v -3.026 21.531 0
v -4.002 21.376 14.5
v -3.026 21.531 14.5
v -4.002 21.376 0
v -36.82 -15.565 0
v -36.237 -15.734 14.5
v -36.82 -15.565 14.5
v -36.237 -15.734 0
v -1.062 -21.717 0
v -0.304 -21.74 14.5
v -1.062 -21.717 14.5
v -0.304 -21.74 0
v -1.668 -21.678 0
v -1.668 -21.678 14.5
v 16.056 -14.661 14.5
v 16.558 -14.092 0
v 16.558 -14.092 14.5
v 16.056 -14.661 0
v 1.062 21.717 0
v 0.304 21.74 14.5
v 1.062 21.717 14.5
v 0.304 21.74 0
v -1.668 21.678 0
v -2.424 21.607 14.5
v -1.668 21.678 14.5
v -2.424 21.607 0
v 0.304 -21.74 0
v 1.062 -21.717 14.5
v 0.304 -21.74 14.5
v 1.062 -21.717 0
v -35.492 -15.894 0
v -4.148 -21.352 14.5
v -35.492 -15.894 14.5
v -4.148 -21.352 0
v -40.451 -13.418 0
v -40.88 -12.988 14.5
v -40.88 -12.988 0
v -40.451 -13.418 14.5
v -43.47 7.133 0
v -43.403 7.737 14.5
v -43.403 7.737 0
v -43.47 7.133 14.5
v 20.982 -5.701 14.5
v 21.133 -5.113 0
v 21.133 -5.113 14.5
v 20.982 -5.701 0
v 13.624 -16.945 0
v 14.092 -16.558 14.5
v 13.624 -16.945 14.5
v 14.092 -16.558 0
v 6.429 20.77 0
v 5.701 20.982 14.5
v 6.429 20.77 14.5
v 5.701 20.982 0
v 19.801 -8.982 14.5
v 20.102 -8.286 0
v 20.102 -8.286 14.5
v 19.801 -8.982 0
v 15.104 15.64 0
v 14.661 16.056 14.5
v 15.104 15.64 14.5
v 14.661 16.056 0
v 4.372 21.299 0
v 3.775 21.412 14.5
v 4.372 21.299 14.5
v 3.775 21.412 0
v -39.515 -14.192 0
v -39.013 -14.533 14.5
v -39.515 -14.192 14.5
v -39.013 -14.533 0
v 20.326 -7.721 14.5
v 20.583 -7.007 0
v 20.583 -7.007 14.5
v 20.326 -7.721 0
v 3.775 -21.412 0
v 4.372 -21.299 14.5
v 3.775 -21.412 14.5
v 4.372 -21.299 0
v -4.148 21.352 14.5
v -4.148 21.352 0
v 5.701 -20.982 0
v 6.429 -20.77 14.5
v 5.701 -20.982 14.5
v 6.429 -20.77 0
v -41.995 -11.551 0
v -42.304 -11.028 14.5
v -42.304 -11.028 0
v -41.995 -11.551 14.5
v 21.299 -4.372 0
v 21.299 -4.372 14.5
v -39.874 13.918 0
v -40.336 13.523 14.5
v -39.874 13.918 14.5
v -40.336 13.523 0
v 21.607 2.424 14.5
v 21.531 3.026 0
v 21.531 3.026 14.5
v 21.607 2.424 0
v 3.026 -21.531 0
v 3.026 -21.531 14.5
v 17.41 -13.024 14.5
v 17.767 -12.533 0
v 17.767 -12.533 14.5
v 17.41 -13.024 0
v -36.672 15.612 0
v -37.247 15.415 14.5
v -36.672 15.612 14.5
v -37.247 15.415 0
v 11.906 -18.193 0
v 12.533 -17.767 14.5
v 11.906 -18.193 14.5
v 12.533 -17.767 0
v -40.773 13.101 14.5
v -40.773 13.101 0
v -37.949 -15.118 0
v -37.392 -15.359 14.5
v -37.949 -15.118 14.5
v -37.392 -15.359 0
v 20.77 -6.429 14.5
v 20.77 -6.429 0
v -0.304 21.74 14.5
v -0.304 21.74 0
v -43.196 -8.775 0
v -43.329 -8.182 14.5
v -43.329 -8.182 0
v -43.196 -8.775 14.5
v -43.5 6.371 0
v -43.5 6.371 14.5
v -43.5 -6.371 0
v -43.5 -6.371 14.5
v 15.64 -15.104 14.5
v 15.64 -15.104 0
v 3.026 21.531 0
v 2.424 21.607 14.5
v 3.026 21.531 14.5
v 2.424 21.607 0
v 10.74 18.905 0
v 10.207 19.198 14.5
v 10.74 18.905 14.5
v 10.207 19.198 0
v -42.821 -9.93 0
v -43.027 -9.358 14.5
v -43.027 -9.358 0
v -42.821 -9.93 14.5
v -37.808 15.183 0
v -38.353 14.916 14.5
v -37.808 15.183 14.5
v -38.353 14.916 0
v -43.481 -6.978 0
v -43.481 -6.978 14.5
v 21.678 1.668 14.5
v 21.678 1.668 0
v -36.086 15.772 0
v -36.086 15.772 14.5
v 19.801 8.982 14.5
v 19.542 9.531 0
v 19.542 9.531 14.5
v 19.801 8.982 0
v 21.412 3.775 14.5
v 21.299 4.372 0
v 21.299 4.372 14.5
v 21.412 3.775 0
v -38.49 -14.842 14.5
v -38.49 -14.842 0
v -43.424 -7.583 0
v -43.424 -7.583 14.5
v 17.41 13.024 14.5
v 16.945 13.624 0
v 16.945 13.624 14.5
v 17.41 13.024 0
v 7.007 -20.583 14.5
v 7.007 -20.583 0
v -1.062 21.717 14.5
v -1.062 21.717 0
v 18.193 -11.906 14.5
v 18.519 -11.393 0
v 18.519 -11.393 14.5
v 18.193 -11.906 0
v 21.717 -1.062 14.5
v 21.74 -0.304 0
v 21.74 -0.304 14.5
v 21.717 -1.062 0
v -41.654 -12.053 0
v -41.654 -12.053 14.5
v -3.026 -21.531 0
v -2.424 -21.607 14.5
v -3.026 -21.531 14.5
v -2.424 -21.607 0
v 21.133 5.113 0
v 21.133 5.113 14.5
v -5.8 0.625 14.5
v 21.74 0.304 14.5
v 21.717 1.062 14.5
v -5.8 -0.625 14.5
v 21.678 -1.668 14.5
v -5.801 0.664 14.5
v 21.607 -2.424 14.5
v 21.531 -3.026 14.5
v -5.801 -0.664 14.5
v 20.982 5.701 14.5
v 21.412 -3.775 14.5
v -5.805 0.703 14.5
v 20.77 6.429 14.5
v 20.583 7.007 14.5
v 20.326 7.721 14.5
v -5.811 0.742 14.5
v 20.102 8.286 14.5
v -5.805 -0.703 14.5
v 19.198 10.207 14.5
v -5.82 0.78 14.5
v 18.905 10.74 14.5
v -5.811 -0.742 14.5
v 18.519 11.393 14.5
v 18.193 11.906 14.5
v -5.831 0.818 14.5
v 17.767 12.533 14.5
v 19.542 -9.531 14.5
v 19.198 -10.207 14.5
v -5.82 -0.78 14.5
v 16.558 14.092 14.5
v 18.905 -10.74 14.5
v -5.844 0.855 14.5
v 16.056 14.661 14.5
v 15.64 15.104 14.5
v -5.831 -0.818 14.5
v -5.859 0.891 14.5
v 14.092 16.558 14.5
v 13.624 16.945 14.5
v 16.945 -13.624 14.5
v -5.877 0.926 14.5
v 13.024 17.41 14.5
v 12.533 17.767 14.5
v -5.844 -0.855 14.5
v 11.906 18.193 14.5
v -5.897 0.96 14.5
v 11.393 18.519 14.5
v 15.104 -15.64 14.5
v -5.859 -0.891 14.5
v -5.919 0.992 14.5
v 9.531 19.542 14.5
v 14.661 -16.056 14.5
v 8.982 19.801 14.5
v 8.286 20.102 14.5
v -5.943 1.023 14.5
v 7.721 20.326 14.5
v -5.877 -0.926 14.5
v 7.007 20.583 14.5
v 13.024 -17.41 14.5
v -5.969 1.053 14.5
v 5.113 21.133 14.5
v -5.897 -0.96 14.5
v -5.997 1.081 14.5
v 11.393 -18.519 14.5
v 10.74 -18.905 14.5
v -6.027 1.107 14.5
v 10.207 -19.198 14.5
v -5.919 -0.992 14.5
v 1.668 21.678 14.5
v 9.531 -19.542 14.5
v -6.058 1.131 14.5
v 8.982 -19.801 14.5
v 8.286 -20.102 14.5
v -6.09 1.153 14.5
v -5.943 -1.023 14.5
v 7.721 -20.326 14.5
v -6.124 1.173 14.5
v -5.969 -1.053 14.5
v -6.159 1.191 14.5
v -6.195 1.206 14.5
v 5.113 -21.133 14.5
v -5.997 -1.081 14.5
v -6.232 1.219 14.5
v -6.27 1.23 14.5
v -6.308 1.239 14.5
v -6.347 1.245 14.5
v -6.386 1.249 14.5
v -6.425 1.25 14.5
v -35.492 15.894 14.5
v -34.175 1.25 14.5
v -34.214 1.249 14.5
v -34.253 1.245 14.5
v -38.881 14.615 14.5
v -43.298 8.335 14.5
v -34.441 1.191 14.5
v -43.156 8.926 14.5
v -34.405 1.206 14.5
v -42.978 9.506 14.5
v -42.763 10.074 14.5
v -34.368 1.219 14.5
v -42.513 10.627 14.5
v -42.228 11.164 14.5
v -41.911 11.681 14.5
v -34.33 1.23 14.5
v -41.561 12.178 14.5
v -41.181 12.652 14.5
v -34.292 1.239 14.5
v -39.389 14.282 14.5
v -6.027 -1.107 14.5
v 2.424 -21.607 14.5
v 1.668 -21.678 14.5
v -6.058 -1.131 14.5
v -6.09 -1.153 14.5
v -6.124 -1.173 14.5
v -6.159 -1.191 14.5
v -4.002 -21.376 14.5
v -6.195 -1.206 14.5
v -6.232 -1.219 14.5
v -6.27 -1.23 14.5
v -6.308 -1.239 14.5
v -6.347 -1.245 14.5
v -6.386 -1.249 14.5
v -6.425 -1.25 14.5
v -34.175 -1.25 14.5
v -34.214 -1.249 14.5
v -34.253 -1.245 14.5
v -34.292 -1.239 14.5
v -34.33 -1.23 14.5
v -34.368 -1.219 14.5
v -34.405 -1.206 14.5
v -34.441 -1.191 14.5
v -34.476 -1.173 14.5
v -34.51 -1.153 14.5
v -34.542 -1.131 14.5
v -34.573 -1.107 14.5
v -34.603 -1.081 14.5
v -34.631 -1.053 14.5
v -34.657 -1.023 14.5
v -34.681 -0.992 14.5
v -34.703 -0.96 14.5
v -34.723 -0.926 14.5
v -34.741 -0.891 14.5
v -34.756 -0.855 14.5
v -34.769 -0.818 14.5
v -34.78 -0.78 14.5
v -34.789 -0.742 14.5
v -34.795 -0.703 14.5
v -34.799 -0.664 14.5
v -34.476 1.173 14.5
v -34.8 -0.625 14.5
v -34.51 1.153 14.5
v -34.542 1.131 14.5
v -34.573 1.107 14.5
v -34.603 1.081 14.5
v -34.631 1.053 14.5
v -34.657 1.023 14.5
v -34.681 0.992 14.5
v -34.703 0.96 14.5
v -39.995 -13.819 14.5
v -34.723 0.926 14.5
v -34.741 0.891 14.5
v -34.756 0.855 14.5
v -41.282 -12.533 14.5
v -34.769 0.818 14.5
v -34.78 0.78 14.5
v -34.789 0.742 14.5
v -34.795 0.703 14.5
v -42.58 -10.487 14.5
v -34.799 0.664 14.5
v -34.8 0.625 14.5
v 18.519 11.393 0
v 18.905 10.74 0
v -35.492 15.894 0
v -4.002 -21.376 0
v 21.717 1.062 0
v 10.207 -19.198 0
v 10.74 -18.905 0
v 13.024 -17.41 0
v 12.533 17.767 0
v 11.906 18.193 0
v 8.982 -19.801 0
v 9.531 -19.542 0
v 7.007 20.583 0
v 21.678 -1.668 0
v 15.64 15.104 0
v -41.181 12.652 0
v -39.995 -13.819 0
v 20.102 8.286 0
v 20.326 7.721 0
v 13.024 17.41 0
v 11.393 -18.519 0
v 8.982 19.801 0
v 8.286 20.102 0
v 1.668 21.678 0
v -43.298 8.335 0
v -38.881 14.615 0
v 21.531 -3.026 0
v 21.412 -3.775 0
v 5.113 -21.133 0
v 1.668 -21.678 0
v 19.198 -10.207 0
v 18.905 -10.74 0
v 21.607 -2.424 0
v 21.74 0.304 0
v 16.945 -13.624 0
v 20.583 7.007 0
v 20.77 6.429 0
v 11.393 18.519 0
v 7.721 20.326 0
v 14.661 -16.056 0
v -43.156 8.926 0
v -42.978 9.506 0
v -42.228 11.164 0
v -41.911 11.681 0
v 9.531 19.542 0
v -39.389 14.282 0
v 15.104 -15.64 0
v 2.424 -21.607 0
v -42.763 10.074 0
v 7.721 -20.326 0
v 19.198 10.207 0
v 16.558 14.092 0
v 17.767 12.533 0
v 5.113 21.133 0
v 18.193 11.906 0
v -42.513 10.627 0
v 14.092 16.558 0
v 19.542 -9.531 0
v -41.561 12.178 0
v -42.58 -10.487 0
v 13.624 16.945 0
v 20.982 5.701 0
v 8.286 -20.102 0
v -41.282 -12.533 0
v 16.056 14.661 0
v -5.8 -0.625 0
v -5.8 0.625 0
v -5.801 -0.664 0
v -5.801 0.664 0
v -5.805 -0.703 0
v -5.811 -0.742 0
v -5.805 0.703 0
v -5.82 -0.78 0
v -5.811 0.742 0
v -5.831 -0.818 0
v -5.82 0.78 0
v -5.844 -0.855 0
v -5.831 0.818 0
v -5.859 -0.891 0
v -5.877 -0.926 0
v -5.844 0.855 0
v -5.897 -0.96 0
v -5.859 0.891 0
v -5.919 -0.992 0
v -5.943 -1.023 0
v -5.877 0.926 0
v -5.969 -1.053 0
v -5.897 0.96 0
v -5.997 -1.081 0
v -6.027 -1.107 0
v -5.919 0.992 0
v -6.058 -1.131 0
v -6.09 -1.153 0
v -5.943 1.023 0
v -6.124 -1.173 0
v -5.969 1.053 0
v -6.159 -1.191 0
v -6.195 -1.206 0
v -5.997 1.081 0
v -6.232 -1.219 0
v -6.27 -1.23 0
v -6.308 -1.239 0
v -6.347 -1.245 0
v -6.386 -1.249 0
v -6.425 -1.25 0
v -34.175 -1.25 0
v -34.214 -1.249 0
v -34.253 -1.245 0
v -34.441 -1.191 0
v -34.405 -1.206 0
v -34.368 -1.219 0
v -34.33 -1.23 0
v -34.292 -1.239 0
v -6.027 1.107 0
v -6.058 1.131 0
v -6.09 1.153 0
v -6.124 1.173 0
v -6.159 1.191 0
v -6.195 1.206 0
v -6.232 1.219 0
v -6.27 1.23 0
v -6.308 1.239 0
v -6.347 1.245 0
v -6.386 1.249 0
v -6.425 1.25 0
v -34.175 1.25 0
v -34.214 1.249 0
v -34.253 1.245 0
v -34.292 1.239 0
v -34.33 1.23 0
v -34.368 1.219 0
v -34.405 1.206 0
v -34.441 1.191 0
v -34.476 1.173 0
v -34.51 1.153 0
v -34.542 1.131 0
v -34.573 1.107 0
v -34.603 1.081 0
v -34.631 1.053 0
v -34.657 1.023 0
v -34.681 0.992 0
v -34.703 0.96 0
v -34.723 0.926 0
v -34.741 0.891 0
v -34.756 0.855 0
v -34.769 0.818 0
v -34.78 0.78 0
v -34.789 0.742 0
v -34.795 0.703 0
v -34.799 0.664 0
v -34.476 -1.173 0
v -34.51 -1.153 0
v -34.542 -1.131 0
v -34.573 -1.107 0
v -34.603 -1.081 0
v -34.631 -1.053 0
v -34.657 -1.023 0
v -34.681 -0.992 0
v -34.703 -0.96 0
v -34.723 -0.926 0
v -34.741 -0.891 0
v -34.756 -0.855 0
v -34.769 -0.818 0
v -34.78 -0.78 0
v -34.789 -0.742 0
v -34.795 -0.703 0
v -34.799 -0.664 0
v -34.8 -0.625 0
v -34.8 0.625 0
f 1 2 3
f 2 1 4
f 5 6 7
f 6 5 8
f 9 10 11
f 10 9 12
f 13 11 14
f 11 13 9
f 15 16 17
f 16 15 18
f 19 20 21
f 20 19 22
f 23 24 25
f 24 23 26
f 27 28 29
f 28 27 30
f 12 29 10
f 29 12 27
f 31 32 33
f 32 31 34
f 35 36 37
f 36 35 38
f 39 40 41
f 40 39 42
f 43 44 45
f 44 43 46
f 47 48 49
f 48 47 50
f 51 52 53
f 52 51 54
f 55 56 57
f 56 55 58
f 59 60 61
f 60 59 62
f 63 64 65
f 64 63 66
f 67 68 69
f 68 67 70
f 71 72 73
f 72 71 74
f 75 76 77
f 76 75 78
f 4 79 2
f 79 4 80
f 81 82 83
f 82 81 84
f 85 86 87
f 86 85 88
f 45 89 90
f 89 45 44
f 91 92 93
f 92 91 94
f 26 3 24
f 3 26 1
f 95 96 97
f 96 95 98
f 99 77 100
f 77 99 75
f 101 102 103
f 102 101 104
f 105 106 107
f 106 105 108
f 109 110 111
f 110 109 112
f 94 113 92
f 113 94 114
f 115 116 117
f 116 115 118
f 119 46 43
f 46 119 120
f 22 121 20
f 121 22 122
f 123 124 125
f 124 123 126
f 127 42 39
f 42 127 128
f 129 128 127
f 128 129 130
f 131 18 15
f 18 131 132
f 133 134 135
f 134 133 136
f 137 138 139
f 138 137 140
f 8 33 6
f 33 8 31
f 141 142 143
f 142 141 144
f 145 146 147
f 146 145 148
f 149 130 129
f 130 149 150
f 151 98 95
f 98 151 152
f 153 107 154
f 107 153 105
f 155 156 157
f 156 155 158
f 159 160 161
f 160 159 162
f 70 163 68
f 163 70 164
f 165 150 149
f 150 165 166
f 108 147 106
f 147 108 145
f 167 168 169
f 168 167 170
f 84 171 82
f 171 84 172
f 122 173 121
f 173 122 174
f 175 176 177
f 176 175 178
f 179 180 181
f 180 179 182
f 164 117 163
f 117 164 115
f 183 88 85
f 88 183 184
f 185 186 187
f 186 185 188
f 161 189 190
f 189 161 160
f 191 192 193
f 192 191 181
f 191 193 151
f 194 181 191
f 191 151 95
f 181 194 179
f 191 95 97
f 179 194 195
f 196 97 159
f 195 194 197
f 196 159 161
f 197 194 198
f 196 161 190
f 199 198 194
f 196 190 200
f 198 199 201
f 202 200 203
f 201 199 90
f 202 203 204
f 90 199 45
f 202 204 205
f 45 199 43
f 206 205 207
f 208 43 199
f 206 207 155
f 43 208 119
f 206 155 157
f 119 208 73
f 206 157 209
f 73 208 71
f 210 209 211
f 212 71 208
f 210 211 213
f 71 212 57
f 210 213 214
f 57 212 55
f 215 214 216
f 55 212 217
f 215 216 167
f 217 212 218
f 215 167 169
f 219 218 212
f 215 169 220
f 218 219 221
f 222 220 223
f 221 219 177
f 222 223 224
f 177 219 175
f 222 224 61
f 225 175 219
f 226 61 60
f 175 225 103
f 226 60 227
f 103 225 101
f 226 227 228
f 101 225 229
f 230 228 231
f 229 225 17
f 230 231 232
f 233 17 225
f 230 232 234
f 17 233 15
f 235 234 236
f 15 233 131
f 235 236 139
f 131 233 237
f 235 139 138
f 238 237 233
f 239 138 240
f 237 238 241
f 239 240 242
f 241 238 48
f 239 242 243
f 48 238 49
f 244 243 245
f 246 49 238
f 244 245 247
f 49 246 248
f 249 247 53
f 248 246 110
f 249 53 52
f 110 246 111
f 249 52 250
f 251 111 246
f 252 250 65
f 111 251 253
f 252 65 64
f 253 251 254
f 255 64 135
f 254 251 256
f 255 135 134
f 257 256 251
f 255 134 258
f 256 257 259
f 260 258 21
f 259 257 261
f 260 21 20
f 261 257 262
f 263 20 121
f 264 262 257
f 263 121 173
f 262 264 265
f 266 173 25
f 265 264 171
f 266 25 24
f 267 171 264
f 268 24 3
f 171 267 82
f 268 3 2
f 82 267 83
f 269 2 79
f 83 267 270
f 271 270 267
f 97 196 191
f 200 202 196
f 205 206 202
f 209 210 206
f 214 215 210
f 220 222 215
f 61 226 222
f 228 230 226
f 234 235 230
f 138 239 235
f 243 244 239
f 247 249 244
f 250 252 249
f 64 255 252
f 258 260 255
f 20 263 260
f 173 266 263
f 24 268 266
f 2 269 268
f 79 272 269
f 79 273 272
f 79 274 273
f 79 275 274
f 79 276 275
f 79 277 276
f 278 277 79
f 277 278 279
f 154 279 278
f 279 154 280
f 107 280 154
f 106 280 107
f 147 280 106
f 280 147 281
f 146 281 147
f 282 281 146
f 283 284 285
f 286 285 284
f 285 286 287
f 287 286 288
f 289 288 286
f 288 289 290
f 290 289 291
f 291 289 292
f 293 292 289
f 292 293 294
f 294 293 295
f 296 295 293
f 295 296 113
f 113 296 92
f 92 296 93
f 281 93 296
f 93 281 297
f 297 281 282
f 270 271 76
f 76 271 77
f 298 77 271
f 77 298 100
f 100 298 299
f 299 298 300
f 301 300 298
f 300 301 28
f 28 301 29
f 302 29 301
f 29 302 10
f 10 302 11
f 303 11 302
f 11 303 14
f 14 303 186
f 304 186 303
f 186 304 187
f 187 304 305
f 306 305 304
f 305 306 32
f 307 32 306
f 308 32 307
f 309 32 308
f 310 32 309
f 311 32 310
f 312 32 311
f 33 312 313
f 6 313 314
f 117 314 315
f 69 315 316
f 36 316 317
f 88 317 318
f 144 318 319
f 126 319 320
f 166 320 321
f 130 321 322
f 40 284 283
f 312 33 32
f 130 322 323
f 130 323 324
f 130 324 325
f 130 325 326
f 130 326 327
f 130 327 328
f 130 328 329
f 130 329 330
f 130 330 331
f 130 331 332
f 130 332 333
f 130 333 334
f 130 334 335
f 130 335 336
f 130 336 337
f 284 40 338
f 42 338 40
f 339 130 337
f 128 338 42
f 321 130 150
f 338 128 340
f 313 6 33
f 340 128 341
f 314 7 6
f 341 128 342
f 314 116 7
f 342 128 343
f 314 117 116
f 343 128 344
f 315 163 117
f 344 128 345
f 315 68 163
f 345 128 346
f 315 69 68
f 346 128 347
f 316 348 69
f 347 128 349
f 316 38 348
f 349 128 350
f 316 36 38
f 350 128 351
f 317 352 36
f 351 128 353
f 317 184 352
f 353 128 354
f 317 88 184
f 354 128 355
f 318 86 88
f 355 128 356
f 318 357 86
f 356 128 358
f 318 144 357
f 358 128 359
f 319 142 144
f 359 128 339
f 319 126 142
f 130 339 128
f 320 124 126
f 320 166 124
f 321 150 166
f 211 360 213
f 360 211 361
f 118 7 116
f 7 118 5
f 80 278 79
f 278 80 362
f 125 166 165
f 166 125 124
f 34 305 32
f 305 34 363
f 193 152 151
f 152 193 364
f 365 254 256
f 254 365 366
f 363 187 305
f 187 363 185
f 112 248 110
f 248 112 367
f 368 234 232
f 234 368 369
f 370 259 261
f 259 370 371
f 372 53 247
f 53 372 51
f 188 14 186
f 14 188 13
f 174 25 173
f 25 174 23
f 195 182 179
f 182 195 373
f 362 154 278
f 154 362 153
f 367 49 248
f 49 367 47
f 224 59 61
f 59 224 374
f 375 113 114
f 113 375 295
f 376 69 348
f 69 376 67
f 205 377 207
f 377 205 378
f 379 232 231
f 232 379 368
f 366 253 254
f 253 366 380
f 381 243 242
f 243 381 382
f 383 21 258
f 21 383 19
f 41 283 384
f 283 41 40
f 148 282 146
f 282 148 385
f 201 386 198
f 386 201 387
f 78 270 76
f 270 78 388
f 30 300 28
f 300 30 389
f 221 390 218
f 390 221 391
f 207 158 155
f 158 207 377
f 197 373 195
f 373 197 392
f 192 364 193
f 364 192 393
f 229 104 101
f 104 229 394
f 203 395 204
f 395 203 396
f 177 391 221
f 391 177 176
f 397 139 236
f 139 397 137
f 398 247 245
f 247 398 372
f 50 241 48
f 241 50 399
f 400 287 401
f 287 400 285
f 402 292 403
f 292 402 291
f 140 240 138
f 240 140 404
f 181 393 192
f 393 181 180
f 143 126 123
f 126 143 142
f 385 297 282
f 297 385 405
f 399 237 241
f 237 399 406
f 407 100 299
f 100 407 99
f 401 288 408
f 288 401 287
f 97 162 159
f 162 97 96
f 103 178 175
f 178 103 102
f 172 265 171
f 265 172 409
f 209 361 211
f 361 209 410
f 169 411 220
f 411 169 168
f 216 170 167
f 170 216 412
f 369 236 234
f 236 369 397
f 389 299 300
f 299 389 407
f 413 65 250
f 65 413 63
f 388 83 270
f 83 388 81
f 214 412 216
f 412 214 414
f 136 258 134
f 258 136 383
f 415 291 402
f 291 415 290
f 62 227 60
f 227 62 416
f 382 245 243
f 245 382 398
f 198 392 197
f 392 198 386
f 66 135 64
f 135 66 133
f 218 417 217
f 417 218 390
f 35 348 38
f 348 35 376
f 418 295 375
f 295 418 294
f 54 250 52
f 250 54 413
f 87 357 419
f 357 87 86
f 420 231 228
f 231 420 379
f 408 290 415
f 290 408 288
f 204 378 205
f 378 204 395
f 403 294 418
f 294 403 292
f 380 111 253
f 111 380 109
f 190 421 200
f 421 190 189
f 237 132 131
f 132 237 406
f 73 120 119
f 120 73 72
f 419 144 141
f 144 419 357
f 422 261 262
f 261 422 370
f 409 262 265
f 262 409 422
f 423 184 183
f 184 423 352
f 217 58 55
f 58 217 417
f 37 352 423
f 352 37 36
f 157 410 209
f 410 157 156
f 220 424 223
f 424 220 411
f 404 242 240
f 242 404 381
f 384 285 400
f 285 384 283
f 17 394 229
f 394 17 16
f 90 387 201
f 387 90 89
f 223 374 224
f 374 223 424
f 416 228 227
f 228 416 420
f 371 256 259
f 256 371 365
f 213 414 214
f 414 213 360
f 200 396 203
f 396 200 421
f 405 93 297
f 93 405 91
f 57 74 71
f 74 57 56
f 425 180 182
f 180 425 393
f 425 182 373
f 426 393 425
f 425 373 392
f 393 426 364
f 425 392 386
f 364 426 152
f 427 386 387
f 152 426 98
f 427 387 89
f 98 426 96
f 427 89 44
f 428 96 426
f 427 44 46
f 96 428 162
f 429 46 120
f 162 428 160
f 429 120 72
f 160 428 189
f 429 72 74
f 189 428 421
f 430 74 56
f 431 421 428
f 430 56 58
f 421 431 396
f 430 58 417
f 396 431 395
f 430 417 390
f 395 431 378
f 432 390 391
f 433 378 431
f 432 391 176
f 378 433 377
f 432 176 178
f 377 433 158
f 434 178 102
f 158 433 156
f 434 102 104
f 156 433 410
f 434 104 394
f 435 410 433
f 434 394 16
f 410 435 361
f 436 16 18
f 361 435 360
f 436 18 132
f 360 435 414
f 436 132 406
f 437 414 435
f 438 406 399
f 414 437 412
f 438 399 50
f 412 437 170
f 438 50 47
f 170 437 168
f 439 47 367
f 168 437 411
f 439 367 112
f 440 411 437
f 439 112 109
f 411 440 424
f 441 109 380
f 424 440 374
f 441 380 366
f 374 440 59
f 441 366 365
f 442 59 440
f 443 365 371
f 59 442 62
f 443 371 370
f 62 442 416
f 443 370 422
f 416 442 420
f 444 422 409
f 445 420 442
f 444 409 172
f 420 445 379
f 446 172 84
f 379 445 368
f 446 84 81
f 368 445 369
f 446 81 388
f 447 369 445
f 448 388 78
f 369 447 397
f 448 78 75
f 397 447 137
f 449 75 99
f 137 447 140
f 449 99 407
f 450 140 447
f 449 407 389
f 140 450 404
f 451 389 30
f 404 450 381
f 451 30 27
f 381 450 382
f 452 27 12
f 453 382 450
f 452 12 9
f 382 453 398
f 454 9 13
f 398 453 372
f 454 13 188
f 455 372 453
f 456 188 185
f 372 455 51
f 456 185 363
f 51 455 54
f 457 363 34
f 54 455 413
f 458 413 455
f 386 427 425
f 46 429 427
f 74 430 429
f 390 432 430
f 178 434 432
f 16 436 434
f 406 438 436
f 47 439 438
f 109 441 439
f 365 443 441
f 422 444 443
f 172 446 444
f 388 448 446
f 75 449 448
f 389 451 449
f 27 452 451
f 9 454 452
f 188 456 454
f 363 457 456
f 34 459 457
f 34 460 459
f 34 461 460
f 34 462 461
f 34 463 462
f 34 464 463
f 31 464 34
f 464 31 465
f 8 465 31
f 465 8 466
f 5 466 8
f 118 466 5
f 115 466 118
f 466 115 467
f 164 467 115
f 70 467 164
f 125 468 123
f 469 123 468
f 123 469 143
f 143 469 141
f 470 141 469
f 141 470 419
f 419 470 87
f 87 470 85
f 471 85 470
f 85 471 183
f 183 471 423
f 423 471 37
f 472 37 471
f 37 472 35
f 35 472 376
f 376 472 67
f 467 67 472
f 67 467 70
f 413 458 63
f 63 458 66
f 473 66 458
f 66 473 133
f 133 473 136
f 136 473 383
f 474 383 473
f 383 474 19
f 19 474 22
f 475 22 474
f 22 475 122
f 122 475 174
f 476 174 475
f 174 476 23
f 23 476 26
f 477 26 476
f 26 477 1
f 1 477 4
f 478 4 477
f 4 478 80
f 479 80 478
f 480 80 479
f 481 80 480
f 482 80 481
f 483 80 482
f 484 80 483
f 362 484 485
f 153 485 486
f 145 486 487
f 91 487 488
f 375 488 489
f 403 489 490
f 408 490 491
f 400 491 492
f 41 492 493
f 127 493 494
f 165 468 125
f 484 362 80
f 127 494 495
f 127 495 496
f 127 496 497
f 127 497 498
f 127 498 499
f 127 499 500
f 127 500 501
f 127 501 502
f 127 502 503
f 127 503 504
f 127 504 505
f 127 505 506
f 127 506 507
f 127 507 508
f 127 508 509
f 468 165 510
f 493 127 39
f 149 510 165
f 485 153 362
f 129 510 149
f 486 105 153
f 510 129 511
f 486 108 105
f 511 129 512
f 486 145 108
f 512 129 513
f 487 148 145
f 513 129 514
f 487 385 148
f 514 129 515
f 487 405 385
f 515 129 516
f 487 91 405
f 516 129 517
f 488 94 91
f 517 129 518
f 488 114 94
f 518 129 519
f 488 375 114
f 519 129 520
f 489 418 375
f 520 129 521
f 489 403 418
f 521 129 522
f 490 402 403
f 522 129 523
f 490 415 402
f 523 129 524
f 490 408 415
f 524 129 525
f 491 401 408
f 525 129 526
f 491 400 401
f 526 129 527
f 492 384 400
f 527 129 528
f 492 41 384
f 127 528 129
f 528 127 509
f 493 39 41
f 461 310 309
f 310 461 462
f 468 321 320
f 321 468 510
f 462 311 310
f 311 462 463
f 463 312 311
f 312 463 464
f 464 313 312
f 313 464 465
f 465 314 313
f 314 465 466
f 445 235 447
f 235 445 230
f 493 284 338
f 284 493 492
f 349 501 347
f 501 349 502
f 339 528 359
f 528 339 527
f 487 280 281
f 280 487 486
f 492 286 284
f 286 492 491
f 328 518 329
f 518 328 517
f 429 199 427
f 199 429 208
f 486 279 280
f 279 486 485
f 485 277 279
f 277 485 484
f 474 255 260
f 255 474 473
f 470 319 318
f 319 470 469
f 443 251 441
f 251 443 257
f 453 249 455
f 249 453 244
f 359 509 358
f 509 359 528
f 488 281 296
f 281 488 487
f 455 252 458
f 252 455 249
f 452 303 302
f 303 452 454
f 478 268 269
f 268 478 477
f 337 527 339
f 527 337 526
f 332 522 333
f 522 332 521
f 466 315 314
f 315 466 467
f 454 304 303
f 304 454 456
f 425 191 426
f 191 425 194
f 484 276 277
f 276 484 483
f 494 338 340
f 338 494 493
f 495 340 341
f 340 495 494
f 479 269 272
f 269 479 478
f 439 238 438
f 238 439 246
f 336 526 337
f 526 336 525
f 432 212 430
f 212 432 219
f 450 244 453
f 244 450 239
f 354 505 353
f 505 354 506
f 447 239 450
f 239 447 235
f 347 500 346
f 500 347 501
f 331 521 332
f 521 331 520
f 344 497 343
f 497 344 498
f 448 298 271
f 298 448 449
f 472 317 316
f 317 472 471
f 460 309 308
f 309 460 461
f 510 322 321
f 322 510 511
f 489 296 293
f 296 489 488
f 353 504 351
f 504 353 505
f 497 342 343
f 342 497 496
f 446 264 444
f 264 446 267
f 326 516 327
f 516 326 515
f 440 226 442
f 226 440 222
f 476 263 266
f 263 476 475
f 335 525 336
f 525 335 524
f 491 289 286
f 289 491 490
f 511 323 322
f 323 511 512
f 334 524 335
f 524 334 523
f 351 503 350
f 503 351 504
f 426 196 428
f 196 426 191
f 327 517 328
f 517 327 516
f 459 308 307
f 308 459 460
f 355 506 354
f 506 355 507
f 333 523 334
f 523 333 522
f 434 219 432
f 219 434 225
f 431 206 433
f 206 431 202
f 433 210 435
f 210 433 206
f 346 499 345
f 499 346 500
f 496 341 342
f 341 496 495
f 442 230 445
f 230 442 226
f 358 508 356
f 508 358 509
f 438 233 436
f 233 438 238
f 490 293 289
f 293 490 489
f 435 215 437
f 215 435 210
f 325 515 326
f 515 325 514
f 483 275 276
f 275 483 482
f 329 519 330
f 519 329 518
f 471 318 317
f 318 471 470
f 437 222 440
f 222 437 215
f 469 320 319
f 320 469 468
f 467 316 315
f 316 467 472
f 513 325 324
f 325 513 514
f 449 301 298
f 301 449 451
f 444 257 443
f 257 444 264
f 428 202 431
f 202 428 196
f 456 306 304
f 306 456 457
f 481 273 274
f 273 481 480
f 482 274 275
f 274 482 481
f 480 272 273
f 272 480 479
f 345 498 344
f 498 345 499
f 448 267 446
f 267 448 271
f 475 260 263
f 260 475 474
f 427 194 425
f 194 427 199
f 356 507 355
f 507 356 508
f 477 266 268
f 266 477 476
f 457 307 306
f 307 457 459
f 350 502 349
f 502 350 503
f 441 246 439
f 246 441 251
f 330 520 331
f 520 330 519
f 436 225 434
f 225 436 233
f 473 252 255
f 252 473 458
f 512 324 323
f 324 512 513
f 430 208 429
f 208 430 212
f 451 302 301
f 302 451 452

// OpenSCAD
//to be used with thing...   https://www.thingiverse.com/thing:3616080

rule_width=29;
rule_thickness=2.5;

height_base(rule_width,rule_thickness);

module height_base(l1,l2){

$fn=100;

difference() { 

union() { 
linear_extrude (height = l1/2){
round2d(OR=l1/3,IR=0){
hull () { 
circle (d = l1*1.5);
translate ([-l1, 0, 0])  square ([ l1,l1 ],center = true);
}}}}



translate ([-l1*0.7, 0, -1]) linear_extrude (height = l1) round2d(OR=l2/4,IR=0) rotate (a = [0, 0, 90]) square ([l2,l1 ],true);
}


}

height_base(29,2.5);



module round2d(OR=3,IR=1){
    offset(OR)offset(-IR-OR)offset(IR)children();
}
